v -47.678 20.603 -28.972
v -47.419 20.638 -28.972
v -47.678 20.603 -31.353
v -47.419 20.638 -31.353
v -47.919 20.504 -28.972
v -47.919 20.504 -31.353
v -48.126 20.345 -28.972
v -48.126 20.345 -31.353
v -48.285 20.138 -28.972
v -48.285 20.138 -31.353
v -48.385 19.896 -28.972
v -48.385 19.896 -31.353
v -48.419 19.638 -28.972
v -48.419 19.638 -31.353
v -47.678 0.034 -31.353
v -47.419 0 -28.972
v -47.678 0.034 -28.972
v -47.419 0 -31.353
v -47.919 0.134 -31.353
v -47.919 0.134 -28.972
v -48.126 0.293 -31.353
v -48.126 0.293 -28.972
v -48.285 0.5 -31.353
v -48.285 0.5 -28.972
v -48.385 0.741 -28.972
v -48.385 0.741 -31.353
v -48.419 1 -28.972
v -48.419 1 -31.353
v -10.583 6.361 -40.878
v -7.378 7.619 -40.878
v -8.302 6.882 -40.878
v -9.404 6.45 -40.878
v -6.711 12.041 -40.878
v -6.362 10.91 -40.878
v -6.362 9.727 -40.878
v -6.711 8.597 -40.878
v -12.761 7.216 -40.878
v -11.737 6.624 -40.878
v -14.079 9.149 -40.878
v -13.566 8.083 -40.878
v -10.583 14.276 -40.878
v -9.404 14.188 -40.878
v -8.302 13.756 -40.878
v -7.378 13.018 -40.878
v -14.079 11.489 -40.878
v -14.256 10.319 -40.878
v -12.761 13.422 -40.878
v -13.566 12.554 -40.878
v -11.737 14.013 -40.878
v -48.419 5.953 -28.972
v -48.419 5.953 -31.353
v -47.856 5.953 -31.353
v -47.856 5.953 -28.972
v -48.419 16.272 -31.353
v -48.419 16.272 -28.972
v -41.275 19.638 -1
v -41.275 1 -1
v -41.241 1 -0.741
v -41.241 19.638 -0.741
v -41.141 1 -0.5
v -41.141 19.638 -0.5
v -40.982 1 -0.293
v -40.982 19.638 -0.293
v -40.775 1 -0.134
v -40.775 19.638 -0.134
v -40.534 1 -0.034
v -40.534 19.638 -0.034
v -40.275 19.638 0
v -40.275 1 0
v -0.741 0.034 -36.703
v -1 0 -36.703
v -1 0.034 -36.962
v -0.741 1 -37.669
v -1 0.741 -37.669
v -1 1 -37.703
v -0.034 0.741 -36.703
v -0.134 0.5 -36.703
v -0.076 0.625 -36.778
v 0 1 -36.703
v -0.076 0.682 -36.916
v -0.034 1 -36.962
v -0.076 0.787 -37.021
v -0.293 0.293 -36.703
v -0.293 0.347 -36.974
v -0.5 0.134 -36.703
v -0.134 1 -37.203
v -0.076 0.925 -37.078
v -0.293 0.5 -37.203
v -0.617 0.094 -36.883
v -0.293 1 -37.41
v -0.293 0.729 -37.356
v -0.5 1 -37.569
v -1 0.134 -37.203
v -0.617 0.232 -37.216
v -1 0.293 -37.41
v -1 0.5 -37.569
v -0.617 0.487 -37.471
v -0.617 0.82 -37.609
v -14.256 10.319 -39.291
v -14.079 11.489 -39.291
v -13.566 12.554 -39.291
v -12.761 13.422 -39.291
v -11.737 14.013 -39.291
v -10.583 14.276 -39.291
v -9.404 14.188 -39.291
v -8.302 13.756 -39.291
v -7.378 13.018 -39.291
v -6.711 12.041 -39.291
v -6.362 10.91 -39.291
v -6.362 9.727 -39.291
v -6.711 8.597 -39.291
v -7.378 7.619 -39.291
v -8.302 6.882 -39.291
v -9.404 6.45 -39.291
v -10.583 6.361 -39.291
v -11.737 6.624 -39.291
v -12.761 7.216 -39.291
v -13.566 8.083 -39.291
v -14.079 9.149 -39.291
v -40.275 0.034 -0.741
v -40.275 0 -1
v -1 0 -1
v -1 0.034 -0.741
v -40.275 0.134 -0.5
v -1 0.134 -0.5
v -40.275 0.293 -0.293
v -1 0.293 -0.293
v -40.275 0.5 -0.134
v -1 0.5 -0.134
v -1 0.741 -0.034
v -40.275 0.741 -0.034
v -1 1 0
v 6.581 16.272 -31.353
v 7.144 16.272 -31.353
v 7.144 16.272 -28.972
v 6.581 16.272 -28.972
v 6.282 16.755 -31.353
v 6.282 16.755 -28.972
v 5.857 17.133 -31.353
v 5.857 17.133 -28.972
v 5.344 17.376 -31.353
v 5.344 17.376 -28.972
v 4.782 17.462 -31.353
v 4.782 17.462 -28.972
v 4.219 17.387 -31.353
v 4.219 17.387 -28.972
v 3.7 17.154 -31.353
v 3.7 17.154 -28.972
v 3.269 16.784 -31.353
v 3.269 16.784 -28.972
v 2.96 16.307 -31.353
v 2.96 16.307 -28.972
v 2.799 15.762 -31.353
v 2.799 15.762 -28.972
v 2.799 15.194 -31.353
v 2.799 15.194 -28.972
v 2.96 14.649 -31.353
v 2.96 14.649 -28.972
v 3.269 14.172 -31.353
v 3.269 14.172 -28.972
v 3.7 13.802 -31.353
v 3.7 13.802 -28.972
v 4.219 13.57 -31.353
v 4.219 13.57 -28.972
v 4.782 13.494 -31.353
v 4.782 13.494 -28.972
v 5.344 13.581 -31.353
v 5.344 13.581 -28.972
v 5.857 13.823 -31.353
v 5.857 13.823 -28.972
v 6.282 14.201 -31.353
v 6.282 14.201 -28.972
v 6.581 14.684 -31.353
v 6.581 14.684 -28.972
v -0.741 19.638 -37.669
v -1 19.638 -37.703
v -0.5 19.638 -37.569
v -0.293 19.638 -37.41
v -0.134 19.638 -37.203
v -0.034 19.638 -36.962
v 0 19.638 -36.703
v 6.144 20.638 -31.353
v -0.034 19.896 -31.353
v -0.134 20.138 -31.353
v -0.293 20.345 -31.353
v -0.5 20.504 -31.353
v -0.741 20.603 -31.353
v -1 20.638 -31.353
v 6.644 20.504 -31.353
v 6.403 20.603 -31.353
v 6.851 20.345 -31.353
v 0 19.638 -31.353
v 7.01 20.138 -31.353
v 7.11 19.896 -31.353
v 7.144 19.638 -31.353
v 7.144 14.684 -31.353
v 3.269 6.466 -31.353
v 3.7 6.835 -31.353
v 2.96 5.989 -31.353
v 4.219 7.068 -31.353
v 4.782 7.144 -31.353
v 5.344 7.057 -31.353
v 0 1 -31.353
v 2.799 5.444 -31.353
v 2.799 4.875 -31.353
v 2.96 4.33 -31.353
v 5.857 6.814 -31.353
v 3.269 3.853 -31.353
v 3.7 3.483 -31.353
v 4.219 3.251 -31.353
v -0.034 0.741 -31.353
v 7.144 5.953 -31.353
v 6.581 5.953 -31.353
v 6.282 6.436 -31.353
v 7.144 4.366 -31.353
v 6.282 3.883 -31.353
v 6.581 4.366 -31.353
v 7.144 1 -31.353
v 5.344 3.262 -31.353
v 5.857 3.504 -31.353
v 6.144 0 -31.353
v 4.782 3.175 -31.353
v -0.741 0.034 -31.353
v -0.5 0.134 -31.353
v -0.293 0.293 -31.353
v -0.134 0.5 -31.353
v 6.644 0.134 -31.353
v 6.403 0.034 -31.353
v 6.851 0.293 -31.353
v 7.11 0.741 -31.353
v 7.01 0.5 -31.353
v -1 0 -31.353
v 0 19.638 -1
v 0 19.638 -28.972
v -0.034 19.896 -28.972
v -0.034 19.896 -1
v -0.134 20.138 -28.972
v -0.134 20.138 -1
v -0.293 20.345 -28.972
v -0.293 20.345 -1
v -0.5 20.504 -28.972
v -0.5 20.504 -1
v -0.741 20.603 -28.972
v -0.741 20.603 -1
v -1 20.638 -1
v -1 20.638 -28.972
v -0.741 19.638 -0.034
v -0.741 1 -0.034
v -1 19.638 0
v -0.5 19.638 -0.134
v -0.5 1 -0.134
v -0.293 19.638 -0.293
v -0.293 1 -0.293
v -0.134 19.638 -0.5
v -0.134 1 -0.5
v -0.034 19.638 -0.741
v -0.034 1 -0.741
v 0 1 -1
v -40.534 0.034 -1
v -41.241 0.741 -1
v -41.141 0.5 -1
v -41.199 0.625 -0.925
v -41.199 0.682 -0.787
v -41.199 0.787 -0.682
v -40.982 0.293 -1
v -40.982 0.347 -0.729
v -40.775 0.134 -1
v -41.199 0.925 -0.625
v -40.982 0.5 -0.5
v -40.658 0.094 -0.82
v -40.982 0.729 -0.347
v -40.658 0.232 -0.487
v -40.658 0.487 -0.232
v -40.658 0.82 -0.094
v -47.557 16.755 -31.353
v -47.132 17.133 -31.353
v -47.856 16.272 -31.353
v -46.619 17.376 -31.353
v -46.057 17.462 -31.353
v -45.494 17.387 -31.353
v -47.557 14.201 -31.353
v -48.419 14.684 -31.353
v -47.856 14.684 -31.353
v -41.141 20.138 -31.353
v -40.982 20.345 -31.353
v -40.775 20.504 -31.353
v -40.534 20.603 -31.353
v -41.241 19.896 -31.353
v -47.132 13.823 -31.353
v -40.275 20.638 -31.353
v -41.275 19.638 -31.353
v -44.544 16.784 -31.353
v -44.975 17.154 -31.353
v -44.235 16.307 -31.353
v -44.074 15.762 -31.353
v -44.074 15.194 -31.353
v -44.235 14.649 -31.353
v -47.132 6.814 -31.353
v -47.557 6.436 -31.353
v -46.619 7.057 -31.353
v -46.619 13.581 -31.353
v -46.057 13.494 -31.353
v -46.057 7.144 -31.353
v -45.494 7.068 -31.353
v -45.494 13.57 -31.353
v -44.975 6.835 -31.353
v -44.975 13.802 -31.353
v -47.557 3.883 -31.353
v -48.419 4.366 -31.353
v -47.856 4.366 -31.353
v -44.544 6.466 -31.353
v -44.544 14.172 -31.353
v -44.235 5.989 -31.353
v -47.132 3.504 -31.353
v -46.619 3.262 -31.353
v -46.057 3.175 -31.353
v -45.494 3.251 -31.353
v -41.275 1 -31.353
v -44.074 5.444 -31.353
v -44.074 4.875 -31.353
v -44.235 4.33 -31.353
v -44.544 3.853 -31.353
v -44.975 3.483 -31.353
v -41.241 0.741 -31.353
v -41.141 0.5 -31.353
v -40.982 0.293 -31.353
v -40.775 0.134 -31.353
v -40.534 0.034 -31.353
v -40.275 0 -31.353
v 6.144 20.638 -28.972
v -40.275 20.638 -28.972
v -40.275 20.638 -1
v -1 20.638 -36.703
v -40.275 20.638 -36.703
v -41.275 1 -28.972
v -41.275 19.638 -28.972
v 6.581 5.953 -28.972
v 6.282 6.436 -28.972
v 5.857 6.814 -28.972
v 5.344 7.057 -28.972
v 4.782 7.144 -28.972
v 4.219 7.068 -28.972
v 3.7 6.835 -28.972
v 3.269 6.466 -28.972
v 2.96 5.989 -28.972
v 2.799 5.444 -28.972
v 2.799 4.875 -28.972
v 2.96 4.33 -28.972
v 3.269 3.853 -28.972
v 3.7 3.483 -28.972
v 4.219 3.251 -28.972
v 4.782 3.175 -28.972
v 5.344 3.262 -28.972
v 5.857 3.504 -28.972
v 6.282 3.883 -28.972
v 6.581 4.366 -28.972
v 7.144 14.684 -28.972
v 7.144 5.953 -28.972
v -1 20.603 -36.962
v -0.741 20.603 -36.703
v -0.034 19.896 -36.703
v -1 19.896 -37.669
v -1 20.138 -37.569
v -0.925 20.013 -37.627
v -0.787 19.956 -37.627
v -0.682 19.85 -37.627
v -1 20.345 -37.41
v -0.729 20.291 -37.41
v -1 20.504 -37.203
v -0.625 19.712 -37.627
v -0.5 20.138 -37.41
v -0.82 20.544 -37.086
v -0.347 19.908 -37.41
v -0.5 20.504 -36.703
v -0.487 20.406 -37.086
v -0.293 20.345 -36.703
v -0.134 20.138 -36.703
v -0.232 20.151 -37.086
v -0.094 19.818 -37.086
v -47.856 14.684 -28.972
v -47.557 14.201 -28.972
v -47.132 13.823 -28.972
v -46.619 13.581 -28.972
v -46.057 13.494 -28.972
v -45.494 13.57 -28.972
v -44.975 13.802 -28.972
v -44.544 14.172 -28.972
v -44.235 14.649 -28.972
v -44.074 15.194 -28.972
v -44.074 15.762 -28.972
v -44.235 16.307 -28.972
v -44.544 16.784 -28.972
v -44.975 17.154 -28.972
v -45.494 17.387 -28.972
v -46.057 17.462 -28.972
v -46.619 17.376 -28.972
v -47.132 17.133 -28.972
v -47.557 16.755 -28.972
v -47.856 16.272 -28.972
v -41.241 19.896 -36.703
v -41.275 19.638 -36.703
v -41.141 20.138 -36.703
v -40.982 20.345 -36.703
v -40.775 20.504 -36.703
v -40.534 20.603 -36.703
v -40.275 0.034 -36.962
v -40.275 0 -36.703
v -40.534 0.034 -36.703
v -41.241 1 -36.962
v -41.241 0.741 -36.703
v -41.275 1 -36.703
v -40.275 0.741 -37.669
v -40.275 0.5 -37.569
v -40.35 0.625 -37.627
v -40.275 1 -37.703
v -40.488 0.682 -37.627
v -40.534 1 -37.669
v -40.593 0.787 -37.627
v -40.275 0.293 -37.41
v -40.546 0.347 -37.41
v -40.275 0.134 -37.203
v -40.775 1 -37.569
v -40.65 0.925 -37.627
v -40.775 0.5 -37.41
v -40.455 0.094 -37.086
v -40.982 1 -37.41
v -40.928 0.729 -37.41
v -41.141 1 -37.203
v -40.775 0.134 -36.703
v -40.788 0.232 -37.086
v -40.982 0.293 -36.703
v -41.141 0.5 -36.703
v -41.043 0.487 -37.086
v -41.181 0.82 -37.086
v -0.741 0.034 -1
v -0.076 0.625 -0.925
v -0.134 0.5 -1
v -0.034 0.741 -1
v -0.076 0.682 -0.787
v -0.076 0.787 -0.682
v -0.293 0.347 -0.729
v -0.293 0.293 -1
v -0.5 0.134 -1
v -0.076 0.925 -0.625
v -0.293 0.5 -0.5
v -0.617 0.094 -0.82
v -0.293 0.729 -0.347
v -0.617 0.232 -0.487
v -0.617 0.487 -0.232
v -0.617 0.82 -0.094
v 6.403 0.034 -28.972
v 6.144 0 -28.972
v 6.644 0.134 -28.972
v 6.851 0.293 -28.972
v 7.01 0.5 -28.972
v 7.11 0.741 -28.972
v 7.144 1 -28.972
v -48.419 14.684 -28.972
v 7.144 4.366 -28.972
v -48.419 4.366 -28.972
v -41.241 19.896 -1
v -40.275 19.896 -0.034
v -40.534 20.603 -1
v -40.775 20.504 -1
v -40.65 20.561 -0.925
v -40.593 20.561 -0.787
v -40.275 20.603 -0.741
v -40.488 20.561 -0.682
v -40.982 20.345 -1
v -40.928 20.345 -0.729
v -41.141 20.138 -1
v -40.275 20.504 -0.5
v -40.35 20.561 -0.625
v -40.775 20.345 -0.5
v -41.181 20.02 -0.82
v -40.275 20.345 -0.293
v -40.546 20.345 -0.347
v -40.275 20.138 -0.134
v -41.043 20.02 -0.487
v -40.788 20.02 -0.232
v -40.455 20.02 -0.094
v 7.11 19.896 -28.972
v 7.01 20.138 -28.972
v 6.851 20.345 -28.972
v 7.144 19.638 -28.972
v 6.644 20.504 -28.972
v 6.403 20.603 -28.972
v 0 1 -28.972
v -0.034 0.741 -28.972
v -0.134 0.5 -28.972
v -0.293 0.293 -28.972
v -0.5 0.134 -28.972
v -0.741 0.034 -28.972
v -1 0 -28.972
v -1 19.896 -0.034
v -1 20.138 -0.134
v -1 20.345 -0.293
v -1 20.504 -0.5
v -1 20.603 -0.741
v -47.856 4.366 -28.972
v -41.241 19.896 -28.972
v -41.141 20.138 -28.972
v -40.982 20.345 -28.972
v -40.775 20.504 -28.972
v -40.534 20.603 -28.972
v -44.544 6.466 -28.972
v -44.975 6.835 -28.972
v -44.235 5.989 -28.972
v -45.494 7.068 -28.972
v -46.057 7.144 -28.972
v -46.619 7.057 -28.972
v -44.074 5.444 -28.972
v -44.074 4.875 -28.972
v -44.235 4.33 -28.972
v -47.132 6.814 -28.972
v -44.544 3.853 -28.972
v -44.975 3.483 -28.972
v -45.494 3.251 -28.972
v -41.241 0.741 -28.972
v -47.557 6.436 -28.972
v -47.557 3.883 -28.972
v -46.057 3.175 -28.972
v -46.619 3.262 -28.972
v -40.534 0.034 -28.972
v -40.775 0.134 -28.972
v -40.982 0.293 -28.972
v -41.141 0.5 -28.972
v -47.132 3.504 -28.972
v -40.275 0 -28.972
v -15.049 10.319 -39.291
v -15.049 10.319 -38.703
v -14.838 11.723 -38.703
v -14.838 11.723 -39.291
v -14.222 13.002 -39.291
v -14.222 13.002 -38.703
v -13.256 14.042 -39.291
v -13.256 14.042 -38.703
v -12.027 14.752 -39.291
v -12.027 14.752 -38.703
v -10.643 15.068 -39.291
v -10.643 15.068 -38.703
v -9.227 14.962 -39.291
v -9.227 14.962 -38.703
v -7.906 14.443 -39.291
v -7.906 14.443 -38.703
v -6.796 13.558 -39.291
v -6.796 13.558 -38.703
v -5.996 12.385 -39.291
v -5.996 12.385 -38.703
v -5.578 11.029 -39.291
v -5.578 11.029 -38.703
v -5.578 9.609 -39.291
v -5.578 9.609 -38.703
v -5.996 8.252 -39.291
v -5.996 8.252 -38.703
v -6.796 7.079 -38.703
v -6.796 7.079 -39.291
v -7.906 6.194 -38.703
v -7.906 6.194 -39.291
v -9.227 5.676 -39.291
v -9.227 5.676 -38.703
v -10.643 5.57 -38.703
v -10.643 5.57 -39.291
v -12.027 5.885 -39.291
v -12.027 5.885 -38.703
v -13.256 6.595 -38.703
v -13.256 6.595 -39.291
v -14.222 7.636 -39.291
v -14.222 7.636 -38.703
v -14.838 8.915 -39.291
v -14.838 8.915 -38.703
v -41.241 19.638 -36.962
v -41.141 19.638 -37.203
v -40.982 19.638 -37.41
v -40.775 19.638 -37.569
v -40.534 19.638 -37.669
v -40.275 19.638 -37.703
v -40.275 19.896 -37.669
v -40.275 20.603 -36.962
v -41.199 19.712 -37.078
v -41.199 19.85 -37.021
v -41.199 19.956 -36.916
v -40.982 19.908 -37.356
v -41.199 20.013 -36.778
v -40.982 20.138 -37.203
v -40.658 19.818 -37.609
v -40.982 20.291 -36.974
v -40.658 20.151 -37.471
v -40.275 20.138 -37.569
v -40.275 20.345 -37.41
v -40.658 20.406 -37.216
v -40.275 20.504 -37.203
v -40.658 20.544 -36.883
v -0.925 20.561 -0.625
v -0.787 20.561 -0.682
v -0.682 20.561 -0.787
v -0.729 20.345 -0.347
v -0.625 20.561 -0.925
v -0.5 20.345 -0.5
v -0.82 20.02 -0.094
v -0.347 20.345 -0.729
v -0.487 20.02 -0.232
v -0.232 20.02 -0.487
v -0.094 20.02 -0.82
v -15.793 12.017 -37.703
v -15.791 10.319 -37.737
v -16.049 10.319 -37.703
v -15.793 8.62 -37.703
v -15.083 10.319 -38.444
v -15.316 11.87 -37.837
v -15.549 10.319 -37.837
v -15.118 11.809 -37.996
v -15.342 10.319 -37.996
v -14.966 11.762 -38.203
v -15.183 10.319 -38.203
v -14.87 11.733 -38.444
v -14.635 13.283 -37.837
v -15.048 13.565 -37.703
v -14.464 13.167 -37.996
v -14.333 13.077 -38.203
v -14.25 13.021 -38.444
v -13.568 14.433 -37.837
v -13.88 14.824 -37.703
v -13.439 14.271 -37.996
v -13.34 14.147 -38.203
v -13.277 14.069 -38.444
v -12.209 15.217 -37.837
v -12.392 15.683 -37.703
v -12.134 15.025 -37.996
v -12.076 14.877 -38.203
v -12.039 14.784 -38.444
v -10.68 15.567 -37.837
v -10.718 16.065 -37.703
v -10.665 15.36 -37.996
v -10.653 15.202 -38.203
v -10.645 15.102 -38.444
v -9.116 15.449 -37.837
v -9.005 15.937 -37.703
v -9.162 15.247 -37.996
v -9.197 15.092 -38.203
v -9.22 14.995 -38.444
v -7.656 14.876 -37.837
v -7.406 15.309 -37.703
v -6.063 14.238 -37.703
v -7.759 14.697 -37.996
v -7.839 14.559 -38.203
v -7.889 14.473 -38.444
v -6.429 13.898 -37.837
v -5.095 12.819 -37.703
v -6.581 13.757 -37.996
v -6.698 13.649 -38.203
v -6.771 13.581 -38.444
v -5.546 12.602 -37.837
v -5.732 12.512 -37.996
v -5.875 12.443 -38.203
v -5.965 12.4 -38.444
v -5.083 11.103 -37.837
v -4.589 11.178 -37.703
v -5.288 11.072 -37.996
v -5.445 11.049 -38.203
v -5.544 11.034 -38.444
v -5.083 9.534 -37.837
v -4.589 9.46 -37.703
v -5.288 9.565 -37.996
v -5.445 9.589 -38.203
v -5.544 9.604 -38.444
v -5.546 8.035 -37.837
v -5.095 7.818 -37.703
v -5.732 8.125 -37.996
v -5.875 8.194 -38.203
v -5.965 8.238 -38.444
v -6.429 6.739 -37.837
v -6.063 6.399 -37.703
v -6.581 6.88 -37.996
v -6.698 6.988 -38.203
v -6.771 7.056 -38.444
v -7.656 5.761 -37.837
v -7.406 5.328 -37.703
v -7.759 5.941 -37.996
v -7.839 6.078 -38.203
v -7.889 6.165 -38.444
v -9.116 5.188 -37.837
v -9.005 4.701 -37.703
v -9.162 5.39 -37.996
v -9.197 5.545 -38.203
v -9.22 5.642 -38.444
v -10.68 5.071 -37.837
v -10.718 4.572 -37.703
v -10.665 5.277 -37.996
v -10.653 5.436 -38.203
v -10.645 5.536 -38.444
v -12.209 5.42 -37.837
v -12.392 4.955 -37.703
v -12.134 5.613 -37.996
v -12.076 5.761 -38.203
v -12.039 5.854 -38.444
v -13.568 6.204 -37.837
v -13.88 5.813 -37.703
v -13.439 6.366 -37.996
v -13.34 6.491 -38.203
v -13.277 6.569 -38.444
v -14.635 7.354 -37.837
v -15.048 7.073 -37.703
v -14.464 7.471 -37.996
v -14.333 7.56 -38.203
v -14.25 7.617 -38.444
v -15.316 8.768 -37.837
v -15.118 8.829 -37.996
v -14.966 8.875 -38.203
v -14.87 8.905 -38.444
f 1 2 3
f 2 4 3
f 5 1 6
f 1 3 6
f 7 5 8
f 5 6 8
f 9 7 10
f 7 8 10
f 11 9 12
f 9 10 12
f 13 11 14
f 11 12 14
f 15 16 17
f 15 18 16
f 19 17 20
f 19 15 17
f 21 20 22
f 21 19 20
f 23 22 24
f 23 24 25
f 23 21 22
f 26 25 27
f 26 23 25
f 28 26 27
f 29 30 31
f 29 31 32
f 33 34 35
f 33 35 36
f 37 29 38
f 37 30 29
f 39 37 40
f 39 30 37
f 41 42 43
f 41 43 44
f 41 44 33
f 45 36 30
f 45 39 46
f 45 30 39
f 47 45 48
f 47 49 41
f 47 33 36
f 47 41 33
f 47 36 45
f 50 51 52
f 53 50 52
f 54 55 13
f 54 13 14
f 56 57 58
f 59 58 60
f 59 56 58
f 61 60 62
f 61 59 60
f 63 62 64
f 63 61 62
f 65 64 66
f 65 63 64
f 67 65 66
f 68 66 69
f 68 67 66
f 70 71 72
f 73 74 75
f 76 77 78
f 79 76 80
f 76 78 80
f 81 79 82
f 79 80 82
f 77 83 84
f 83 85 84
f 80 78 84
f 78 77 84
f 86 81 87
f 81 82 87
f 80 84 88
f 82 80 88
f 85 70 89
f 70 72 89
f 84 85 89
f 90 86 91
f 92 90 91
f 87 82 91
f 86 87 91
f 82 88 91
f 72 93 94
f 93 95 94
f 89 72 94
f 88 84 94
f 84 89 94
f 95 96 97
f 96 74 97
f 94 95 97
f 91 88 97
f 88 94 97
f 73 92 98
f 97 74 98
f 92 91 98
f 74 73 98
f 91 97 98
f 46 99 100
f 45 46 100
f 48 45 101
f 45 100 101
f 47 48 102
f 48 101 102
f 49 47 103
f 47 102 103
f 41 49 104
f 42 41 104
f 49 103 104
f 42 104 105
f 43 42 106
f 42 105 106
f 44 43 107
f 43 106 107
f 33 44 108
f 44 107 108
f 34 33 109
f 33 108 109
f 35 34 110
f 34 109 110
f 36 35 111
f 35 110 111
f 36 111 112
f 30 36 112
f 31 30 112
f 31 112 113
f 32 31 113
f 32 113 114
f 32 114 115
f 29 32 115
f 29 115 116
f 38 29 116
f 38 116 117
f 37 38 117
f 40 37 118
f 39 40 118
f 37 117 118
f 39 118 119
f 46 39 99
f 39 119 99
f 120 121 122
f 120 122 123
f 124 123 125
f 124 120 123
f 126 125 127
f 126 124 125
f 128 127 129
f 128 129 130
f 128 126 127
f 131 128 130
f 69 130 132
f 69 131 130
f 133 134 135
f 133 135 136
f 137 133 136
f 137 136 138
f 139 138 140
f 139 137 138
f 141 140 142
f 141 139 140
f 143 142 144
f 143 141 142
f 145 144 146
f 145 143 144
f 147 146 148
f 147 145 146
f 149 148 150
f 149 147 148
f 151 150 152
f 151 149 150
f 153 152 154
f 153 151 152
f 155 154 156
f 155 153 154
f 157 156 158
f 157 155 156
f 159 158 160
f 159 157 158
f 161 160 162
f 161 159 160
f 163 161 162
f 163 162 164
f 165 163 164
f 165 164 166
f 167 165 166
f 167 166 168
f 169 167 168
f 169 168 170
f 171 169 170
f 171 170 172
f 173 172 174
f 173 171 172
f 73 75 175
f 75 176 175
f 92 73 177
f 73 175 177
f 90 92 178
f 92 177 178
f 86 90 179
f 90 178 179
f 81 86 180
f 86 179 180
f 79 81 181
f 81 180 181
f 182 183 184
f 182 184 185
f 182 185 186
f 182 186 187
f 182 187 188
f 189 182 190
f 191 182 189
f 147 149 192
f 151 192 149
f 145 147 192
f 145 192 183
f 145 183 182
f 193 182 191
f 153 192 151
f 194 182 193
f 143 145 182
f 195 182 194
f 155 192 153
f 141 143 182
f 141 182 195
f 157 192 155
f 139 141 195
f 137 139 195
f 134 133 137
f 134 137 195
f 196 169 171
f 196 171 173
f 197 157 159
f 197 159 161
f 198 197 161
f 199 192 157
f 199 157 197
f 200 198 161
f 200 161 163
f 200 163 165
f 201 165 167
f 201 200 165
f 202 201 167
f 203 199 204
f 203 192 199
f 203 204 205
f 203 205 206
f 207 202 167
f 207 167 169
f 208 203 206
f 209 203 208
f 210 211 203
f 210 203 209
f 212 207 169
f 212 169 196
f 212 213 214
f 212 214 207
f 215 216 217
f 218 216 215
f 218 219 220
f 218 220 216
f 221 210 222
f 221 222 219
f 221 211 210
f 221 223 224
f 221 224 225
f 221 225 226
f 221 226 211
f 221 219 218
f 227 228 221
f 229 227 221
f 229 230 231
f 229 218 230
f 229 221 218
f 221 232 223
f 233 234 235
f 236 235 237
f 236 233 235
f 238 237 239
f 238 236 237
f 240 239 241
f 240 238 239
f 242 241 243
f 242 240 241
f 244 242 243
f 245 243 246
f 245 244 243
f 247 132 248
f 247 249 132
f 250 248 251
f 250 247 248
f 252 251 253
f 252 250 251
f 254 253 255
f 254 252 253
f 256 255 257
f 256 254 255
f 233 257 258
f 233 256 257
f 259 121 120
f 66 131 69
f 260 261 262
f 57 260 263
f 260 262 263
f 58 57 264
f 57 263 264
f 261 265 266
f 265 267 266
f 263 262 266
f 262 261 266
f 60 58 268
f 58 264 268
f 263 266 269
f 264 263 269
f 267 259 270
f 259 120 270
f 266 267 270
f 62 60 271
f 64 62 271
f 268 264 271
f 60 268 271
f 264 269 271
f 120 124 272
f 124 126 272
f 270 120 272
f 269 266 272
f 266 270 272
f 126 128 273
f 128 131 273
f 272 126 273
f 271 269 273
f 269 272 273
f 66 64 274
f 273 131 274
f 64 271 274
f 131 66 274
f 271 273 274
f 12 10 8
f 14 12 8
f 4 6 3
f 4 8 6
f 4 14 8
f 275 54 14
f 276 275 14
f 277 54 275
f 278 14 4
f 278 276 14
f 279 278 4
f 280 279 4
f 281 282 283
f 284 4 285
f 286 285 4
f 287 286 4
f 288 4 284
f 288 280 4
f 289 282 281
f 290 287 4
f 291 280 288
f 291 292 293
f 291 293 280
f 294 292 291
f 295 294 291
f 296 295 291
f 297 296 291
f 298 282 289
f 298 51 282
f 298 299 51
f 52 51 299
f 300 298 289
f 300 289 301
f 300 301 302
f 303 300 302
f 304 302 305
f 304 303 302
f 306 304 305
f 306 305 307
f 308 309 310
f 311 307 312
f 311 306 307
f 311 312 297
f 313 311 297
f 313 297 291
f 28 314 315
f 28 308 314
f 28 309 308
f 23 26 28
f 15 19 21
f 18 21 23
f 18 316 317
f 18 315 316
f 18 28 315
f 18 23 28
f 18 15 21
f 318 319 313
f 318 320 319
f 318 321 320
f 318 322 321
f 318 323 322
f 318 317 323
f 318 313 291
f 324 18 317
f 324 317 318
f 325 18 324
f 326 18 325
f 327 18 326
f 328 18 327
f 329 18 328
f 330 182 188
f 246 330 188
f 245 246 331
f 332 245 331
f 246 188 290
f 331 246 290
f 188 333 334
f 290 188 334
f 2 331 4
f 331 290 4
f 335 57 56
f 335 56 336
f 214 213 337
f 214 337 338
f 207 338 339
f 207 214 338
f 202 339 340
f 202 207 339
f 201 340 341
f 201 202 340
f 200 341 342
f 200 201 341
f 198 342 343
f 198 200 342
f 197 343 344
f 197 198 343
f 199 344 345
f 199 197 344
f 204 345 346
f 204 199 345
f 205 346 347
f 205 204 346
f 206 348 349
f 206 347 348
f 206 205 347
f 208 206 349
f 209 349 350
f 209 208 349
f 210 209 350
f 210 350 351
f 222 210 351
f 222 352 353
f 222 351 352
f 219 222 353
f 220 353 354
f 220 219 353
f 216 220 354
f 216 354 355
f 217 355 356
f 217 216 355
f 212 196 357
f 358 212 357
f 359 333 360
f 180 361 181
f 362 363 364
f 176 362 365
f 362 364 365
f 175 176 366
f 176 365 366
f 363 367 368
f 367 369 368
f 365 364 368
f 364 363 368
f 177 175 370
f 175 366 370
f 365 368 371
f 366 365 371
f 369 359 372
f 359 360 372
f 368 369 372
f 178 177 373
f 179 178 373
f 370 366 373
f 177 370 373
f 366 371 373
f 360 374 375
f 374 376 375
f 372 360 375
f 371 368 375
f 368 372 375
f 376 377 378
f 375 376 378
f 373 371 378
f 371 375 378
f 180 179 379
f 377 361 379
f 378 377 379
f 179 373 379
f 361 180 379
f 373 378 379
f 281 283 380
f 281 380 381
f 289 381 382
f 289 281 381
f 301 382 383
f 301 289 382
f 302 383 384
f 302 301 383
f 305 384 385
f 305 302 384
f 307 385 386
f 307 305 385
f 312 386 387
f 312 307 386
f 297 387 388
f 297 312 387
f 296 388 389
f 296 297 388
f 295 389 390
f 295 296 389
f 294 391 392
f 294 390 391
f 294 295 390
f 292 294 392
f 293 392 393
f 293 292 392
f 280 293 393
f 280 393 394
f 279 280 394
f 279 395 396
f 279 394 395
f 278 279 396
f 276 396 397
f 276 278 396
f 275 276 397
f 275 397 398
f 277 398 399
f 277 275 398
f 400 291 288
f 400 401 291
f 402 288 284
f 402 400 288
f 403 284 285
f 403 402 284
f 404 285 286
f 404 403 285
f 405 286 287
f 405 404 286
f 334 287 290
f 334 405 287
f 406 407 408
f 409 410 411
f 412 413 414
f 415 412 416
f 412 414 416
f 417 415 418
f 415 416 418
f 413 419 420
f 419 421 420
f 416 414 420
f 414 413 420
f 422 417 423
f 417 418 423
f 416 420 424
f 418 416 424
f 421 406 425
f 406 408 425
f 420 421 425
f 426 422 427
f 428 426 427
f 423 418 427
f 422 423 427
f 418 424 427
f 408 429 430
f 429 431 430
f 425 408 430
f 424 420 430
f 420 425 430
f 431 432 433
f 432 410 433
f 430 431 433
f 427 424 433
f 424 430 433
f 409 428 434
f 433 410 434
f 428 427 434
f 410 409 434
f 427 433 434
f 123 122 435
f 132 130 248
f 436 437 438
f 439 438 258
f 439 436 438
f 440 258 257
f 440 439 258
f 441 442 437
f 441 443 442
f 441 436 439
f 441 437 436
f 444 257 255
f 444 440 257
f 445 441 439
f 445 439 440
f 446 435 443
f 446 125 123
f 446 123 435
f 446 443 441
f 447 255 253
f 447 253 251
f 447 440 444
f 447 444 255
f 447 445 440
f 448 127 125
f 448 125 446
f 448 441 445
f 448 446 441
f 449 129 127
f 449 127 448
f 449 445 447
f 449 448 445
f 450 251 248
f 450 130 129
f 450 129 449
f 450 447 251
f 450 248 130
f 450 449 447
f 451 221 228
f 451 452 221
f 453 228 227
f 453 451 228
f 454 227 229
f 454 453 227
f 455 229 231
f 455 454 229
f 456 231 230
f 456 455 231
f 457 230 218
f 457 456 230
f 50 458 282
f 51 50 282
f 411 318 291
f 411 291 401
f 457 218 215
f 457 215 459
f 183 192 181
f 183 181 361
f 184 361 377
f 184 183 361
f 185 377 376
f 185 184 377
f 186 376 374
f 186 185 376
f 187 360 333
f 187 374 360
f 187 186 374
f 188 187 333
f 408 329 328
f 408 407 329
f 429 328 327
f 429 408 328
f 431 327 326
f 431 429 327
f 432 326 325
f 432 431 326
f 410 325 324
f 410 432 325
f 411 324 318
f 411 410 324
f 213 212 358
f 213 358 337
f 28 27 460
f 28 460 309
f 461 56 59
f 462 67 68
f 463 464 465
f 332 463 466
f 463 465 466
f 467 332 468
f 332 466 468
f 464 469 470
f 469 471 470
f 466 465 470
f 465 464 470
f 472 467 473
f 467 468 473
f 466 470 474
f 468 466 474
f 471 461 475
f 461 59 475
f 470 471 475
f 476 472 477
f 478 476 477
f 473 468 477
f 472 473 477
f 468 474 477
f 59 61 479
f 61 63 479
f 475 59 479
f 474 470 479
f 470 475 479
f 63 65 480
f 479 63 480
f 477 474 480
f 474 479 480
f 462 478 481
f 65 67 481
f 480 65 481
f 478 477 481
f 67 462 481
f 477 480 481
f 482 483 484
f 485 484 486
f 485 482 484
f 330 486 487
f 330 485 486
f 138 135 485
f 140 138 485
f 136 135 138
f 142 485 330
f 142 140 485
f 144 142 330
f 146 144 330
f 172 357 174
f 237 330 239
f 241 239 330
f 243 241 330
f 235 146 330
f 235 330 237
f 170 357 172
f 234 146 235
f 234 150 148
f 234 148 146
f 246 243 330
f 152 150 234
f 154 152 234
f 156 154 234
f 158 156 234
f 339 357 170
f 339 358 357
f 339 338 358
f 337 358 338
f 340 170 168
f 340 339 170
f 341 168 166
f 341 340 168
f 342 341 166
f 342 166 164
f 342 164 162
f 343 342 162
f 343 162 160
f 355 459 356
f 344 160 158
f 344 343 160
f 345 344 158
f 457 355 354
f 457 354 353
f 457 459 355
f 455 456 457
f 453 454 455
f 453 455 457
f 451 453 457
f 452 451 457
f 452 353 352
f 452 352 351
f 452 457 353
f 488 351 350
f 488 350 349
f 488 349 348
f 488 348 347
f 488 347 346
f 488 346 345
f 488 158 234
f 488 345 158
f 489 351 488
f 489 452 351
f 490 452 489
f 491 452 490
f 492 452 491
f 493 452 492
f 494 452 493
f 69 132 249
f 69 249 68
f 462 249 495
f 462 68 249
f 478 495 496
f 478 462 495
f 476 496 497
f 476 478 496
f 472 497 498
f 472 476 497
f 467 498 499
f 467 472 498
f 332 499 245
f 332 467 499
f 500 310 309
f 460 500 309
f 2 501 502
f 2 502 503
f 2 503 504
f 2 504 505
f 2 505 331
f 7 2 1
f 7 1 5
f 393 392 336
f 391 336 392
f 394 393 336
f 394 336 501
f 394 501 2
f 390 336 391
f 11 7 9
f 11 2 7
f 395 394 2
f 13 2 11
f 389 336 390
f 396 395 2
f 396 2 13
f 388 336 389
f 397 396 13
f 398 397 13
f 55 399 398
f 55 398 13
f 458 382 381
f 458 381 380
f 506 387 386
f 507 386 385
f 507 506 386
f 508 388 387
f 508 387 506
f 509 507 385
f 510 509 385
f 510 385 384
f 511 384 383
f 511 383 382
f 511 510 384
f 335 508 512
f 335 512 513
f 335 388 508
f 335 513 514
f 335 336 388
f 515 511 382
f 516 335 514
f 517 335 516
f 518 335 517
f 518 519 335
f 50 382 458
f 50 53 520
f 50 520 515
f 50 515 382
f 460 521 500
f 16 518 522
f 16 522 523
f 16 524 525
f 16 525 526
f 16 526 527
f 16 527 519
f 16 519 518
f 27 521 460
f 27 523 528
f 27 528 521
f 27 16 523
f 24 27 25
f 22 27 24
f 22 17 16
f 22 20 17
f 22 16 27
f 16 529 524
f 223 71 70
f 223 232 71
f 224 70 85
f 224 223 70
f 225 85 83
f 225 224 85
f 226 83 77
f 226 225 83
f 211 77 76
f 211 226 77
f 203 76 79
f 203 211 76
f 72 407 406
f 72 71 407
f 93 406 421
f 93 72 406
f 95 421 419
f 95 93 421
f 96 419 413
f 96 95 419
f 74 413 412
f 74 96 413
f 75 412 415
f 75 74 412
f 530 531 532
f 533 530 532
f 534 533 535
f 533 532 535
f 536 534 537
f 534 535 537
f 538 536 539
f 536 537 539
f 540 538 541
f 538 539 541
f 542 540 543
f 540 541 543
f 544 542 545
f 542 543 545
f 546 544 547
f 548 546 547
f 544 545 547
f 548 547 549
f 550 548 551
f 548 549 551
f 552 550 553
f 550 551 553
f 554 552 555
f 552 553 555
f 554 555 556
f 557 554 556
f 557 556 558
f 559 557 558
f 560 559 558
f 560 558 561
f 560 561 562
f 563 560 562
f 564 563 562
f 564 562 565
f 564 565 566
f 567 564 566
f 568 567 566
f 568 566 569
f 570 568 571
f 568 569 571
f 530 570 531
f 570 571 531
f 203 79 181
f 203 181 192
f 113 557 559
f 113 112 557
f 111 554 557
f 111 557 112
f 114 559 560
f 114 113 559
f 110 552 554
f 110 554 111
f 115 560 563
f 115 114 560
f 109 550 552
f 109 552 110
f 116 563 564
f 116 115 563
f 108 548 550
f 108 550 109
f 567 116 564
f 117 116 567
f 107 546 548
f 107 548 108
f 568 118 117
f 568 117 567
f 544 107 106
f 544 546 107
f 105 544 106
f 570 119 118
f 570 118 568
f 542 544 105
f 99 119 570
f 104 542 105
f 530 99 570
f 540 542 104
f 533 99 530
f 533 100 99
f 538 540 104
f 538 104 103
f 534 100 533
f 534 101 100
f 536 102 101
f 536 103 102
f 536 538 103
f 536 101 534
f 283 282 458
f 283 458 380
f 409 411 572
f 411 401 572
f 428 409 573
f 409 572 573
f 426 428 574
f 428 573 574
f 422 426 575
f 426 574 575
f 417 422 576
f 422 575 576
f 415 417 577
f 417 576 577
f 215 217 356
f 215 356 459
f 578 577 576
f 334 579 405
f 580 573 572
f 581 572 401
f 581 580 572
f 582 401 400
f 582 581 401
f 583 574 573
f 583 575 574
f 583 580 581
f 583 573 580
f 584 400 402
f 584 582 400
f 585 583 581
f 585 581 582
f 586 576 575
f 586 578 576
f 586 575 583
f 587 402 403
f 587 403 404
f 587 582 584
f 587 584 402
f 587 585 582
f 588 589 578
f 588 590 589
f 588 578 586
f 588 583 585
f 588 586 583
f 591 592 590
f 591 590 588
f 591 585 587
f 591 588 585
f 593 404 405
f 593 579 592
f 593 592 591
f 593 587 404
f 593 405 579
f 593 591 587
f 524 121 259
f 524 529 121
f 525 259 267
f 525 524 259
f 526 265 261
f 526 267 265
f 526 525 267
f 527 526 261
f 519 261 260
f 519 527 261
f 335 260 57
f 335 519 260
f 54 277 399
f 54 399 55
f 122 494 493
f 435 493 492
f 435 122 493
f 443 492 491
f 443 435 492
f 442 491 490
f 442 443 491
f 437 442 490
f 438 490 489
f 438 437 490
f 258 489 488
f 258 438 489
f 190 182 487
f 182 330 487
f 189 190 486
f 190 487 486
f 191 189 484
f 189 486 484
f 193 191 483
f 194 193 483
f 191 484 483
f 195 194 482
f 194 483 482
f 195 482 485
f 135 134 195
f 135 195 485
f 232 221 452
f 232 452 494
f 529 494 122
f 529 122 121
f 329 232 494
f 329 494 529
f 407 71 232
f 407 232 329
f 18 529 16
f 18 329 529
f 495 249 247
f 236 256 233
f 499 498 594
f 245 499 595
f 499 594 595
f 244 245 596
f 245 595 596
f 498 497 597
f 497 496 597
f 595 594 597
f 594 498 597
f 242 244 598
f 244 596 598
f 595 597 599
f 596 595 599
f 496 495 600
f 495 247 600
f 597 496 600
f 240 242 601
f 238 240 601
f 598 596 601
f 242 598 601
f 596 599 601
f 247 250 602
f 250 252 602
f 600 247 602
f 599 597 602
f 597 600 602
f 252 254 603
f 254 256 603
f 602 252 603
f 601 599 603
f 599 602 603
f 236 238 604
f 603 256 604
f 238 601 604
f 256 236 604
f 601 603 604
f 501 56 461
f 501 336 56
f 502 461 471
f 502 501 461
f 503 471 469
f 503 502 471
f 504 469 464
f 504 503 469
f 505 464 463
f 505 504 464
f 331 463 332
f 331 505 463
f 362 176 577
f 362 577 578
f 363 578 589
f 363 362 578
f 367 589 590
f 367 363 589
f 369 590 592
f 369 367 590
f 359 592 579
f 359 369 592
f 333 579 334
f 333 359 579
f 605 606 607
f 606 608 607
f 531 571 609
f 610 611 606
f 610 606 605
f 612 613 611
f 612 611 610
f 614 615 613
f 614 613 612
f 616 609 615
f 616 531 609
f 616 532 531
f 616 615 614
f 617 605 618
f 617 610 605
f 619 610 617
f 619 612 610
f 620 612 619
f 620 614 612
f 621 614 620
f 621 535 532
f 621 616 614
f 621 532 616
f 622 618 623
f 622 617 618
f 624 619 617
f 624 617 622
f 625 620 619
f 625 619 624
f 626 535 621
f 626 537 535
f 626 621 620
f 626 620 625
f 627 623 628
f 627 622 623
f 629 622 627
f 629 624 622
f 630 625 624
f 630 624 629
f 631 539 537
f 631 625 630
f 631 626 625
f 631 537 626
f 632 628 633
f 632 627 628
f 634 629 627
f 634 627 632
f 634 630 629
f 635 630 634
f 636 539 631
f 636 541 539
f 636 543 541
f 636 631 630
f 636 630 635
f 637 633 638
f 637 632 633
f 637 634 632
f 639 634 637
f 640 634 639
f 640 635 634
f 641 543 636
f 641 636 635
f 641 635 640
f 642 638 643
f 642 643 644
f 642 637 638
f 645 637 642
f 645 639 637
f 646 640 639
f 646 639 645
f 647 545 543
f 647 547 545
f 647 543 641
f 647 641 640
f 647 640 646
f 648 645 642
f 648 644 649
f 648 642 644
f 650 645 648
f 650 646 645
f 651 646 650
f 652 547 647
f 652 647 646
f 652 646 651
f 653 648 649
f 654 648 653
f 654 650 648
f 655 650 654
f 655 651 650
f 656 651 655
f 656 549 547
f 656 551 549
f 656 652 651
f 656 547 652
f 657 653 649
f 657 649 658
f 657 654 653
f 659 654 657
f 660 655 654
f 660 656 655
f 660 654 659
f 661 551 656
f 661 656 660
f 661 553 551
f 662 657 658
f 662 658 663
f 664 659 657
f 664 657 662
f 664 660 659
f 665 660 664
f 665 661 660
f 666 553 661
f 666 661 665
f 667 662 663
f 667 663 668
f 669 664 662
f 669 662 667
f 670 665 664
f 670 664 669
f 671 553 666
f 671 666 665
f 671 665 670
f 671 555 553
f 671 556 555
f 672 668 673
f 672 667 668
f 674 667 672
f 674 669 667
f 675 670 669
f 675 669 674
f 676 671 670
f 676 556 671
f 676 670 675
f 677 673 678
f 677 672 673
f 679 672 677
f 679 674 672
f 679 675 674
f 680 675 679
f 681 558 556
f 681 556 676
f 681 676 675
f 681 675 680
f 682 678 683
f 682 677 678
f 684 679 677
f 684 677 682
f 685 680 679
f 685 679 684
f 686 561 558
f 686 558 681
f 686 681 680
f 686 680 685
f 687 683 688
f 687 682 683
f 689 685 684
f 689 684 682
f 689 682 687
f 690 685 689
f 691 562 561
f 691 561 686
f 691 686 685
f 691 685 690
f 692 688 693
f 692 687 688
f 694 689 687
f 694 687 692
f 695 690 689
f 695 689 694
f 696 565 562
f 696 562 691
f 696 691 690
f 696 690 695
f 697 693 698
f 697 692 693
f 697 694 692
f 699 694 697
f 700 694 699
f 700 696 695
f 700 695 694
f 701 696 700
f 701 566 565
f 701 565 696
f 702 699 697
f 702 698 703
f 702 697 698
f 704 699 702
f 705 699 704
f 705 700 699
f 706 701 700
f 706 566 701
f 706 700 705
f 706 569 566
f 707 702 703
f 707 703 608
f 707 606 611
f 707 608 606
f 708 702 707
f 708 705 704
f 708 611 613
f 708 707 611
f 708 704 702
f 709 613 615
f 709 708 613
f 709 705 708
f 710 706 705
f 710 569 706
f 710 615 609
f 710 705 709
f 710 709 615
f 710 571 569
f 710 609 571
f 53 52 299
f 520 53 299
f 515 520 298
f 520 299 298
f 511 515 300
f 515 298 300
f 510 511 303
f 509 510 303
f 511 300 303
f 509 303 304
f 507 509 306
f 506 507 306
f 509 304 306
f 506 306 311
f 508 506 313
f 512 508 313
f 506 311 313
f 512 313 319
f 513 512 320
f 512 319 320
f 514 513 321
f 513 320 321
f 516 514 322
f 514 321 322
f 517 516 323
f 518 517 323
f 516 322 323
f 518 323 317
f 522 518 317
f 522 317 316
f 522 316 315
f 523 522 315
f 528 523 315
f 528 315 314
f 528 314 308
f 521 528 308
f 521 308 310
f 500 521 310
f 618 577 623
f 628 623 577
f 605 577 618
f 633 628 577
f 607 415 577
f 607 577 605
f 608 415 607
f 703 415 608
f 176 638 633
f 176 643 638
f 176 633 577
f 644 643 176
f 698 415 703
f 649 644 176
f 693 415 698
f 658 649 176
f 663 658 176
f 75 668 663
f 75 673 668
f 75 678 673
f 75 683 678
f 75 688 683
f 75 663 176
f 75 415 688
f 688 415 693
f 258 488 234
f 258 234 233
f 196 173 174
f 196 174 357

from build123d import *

# Parameters (mm, degrees)
BOSS_EXTRUDE1_DEPTH = 20.6375
CUT_EXTRUDE1_DEPTH  = 32.353125
FILLET1_R           = 1
FILLET2_R           = 1
SKETCH3_R           = 4.7625
BOSS_EXTRUDE2_DEPTH = 1.5875
FILLET3_R           = 1
SKETCH4_R           = 3.96875
BOSS_EXTRUDE3_DEPTH = 1.5875


with BuildPart() as part:
    # Sketch1 → Boss-Extrude1 (new body)
    with BuildSketch(Plane(origin=(0, 0, 0), x_dir=(1, 0, 0), z_dir=(0, 1, 0))):
        Polygon((0, 0), (-41.275, 0), (-41.275, 28.971875), (-48.41875, 28.971875), (-48.41875, 31.353125), (-41.275, 31.353125), (-41.275, 37.703125), (0, 37.703125), (0, 31.353125), (7.14375, 31.353125), (7.14375, 28.971875), (0, 28.971875), align=None)
    extrude(amount=BOSS_EXTRUDE1_DEPTH)

    # Sketch2 → Cut-Extrude1 (cut, through all)
    with BuildSketch(Plane(origin=(0, 0, -31.353125), x_dir=(-1, 0, 0), z_dir=(0, 0, -1))):
        with BuildLine():
            Line((-7.14375, 16.271875), (-6.581209729, 16.271875))
            ThreePointArc((-6.581209729, 16.271875), (-2.778125, 15.478125), (-6.581209729, 14.684375))
            Line((-6.581209729, 14.684375), (-7.14375, 14.684375))
            Line((-7.14375, 14.684375), (-7.14375, 16.271875))
        make_face()
        with BuildLine():
            Line((47.856209729, 16.271875), (48.41875, 16.271875))
            Line((48.41875, 16.271875), (48.41875, 14.684375))
            Line((48.41875, 14.684375), (47.856209729, 14.684375))
            ThreePointArc((47.856209729, 14.684375), (44.053125, 15.478125), (47.856209729, 16.271875))
        make_face()
        with BuildLine():
            Line((47.856209729, 4.365625), (48.41875, 4.365625))
            Line((48.41875, 4.365625), (48.41875, 5.953125))
            Line((48.41875, 5.953125), (47.856209729, 5.953125))
            ThreePointArc((47.856209729, 5.953125), (44.053125, 5.159375), (47.856209729, 4.365625))
        make_face()
        with BuildLine():
            Line((-7.14375, 5.953125), (-6.581209729, 5.953125))
            ThreePointArc((-6.581209729, 5.953125), (-2.778125, 5.159375), (-6.581209729, 4.365625))
            Line((-6.581209729, 4.365625), (-7.14375, 4.365625))
            Line((-7.14375, 4.365625), (-7.14375, 5.953125))
        make_face()
    extrude(amount=-CUT_EXTRUDE1_DEPTH, mode=Mode.SUBTRACT)

    # Fillet1
    fillet1_edges = [part.edges().sort_by_distance(p)[0] for p in [
        (7.14375, 20.6375, -30.1625),
        (-48.41875, 0, -30.1625),
        (7.14375, 0, -30.1625),
        (-48.41875, 20.6375, -30.1625),
    ]]
    fillet(fillet1_edges, radius=FILLET1_R)

    # Fillet2
    fillet2_edges = [part.edges().sort_by_distance(p)[0] for p in [
        (-20.6375, 0, 0),
        (-41.275, 0, -14.4859375),
        (-41.275, 0, -34.528125),
        (-20.6375, 0, -37.703125),
        (0, 0, -34.528125),
        (0, 0, -14.4859375),
        (0, 20.6375, -34.528125),
        (-20.6375, 20.6375, -37.703125),
        (0, 10.31875, 0),
        (-41.275, 10.31875, 0),
        (-41.275, 10.31875, -37.703125),
        (0, 10.31875, -37.703125),
        (-41.275, 20.6375, -34.528125),
        (-41.275, 20.6375, -14.4859375),
        (-20.6375, 20.6375, 0),
        (0, 20.6375, -14.4859375),
    ]]
    fillet(fillet2_edges, radius=FILLET2_R)

    # Sketch3 → Boss-Extrude2 (add)
    with BuildSketch(Plane(origin=(0, 0, -37.703125), x_dir=(-1, 0, 0), z_dir=(0, 0, -1))):
        with Locations((10.286875, 10.31875)):
            Circle(SKETCH3_R)
    extrude(amount=BOSS_EXTRUDE2_DEPTH)

    # Fillet3
    fillet3_edges = [part.edges().sort_by_distance(p)[0] for p in [
        (-5.524375, 10.31875, -37.703125),
    ]]
    fillet(fillet3_edges, radius=FILLET3_R)

    # Sketch4 → Boss-Extrude3 (add)
    with BuildSketch(Plane(origin=(0, 0, -39.290625), x_dir=(-1, 0, 0), z_dir=(0, 0, -1))):
        with Locations((10.286875, 10.31875)):
            Circle(SKETCH4_R)
    extrude(amount=BOSS_EXTRUDE3_DEPTH)


solid = part.part
